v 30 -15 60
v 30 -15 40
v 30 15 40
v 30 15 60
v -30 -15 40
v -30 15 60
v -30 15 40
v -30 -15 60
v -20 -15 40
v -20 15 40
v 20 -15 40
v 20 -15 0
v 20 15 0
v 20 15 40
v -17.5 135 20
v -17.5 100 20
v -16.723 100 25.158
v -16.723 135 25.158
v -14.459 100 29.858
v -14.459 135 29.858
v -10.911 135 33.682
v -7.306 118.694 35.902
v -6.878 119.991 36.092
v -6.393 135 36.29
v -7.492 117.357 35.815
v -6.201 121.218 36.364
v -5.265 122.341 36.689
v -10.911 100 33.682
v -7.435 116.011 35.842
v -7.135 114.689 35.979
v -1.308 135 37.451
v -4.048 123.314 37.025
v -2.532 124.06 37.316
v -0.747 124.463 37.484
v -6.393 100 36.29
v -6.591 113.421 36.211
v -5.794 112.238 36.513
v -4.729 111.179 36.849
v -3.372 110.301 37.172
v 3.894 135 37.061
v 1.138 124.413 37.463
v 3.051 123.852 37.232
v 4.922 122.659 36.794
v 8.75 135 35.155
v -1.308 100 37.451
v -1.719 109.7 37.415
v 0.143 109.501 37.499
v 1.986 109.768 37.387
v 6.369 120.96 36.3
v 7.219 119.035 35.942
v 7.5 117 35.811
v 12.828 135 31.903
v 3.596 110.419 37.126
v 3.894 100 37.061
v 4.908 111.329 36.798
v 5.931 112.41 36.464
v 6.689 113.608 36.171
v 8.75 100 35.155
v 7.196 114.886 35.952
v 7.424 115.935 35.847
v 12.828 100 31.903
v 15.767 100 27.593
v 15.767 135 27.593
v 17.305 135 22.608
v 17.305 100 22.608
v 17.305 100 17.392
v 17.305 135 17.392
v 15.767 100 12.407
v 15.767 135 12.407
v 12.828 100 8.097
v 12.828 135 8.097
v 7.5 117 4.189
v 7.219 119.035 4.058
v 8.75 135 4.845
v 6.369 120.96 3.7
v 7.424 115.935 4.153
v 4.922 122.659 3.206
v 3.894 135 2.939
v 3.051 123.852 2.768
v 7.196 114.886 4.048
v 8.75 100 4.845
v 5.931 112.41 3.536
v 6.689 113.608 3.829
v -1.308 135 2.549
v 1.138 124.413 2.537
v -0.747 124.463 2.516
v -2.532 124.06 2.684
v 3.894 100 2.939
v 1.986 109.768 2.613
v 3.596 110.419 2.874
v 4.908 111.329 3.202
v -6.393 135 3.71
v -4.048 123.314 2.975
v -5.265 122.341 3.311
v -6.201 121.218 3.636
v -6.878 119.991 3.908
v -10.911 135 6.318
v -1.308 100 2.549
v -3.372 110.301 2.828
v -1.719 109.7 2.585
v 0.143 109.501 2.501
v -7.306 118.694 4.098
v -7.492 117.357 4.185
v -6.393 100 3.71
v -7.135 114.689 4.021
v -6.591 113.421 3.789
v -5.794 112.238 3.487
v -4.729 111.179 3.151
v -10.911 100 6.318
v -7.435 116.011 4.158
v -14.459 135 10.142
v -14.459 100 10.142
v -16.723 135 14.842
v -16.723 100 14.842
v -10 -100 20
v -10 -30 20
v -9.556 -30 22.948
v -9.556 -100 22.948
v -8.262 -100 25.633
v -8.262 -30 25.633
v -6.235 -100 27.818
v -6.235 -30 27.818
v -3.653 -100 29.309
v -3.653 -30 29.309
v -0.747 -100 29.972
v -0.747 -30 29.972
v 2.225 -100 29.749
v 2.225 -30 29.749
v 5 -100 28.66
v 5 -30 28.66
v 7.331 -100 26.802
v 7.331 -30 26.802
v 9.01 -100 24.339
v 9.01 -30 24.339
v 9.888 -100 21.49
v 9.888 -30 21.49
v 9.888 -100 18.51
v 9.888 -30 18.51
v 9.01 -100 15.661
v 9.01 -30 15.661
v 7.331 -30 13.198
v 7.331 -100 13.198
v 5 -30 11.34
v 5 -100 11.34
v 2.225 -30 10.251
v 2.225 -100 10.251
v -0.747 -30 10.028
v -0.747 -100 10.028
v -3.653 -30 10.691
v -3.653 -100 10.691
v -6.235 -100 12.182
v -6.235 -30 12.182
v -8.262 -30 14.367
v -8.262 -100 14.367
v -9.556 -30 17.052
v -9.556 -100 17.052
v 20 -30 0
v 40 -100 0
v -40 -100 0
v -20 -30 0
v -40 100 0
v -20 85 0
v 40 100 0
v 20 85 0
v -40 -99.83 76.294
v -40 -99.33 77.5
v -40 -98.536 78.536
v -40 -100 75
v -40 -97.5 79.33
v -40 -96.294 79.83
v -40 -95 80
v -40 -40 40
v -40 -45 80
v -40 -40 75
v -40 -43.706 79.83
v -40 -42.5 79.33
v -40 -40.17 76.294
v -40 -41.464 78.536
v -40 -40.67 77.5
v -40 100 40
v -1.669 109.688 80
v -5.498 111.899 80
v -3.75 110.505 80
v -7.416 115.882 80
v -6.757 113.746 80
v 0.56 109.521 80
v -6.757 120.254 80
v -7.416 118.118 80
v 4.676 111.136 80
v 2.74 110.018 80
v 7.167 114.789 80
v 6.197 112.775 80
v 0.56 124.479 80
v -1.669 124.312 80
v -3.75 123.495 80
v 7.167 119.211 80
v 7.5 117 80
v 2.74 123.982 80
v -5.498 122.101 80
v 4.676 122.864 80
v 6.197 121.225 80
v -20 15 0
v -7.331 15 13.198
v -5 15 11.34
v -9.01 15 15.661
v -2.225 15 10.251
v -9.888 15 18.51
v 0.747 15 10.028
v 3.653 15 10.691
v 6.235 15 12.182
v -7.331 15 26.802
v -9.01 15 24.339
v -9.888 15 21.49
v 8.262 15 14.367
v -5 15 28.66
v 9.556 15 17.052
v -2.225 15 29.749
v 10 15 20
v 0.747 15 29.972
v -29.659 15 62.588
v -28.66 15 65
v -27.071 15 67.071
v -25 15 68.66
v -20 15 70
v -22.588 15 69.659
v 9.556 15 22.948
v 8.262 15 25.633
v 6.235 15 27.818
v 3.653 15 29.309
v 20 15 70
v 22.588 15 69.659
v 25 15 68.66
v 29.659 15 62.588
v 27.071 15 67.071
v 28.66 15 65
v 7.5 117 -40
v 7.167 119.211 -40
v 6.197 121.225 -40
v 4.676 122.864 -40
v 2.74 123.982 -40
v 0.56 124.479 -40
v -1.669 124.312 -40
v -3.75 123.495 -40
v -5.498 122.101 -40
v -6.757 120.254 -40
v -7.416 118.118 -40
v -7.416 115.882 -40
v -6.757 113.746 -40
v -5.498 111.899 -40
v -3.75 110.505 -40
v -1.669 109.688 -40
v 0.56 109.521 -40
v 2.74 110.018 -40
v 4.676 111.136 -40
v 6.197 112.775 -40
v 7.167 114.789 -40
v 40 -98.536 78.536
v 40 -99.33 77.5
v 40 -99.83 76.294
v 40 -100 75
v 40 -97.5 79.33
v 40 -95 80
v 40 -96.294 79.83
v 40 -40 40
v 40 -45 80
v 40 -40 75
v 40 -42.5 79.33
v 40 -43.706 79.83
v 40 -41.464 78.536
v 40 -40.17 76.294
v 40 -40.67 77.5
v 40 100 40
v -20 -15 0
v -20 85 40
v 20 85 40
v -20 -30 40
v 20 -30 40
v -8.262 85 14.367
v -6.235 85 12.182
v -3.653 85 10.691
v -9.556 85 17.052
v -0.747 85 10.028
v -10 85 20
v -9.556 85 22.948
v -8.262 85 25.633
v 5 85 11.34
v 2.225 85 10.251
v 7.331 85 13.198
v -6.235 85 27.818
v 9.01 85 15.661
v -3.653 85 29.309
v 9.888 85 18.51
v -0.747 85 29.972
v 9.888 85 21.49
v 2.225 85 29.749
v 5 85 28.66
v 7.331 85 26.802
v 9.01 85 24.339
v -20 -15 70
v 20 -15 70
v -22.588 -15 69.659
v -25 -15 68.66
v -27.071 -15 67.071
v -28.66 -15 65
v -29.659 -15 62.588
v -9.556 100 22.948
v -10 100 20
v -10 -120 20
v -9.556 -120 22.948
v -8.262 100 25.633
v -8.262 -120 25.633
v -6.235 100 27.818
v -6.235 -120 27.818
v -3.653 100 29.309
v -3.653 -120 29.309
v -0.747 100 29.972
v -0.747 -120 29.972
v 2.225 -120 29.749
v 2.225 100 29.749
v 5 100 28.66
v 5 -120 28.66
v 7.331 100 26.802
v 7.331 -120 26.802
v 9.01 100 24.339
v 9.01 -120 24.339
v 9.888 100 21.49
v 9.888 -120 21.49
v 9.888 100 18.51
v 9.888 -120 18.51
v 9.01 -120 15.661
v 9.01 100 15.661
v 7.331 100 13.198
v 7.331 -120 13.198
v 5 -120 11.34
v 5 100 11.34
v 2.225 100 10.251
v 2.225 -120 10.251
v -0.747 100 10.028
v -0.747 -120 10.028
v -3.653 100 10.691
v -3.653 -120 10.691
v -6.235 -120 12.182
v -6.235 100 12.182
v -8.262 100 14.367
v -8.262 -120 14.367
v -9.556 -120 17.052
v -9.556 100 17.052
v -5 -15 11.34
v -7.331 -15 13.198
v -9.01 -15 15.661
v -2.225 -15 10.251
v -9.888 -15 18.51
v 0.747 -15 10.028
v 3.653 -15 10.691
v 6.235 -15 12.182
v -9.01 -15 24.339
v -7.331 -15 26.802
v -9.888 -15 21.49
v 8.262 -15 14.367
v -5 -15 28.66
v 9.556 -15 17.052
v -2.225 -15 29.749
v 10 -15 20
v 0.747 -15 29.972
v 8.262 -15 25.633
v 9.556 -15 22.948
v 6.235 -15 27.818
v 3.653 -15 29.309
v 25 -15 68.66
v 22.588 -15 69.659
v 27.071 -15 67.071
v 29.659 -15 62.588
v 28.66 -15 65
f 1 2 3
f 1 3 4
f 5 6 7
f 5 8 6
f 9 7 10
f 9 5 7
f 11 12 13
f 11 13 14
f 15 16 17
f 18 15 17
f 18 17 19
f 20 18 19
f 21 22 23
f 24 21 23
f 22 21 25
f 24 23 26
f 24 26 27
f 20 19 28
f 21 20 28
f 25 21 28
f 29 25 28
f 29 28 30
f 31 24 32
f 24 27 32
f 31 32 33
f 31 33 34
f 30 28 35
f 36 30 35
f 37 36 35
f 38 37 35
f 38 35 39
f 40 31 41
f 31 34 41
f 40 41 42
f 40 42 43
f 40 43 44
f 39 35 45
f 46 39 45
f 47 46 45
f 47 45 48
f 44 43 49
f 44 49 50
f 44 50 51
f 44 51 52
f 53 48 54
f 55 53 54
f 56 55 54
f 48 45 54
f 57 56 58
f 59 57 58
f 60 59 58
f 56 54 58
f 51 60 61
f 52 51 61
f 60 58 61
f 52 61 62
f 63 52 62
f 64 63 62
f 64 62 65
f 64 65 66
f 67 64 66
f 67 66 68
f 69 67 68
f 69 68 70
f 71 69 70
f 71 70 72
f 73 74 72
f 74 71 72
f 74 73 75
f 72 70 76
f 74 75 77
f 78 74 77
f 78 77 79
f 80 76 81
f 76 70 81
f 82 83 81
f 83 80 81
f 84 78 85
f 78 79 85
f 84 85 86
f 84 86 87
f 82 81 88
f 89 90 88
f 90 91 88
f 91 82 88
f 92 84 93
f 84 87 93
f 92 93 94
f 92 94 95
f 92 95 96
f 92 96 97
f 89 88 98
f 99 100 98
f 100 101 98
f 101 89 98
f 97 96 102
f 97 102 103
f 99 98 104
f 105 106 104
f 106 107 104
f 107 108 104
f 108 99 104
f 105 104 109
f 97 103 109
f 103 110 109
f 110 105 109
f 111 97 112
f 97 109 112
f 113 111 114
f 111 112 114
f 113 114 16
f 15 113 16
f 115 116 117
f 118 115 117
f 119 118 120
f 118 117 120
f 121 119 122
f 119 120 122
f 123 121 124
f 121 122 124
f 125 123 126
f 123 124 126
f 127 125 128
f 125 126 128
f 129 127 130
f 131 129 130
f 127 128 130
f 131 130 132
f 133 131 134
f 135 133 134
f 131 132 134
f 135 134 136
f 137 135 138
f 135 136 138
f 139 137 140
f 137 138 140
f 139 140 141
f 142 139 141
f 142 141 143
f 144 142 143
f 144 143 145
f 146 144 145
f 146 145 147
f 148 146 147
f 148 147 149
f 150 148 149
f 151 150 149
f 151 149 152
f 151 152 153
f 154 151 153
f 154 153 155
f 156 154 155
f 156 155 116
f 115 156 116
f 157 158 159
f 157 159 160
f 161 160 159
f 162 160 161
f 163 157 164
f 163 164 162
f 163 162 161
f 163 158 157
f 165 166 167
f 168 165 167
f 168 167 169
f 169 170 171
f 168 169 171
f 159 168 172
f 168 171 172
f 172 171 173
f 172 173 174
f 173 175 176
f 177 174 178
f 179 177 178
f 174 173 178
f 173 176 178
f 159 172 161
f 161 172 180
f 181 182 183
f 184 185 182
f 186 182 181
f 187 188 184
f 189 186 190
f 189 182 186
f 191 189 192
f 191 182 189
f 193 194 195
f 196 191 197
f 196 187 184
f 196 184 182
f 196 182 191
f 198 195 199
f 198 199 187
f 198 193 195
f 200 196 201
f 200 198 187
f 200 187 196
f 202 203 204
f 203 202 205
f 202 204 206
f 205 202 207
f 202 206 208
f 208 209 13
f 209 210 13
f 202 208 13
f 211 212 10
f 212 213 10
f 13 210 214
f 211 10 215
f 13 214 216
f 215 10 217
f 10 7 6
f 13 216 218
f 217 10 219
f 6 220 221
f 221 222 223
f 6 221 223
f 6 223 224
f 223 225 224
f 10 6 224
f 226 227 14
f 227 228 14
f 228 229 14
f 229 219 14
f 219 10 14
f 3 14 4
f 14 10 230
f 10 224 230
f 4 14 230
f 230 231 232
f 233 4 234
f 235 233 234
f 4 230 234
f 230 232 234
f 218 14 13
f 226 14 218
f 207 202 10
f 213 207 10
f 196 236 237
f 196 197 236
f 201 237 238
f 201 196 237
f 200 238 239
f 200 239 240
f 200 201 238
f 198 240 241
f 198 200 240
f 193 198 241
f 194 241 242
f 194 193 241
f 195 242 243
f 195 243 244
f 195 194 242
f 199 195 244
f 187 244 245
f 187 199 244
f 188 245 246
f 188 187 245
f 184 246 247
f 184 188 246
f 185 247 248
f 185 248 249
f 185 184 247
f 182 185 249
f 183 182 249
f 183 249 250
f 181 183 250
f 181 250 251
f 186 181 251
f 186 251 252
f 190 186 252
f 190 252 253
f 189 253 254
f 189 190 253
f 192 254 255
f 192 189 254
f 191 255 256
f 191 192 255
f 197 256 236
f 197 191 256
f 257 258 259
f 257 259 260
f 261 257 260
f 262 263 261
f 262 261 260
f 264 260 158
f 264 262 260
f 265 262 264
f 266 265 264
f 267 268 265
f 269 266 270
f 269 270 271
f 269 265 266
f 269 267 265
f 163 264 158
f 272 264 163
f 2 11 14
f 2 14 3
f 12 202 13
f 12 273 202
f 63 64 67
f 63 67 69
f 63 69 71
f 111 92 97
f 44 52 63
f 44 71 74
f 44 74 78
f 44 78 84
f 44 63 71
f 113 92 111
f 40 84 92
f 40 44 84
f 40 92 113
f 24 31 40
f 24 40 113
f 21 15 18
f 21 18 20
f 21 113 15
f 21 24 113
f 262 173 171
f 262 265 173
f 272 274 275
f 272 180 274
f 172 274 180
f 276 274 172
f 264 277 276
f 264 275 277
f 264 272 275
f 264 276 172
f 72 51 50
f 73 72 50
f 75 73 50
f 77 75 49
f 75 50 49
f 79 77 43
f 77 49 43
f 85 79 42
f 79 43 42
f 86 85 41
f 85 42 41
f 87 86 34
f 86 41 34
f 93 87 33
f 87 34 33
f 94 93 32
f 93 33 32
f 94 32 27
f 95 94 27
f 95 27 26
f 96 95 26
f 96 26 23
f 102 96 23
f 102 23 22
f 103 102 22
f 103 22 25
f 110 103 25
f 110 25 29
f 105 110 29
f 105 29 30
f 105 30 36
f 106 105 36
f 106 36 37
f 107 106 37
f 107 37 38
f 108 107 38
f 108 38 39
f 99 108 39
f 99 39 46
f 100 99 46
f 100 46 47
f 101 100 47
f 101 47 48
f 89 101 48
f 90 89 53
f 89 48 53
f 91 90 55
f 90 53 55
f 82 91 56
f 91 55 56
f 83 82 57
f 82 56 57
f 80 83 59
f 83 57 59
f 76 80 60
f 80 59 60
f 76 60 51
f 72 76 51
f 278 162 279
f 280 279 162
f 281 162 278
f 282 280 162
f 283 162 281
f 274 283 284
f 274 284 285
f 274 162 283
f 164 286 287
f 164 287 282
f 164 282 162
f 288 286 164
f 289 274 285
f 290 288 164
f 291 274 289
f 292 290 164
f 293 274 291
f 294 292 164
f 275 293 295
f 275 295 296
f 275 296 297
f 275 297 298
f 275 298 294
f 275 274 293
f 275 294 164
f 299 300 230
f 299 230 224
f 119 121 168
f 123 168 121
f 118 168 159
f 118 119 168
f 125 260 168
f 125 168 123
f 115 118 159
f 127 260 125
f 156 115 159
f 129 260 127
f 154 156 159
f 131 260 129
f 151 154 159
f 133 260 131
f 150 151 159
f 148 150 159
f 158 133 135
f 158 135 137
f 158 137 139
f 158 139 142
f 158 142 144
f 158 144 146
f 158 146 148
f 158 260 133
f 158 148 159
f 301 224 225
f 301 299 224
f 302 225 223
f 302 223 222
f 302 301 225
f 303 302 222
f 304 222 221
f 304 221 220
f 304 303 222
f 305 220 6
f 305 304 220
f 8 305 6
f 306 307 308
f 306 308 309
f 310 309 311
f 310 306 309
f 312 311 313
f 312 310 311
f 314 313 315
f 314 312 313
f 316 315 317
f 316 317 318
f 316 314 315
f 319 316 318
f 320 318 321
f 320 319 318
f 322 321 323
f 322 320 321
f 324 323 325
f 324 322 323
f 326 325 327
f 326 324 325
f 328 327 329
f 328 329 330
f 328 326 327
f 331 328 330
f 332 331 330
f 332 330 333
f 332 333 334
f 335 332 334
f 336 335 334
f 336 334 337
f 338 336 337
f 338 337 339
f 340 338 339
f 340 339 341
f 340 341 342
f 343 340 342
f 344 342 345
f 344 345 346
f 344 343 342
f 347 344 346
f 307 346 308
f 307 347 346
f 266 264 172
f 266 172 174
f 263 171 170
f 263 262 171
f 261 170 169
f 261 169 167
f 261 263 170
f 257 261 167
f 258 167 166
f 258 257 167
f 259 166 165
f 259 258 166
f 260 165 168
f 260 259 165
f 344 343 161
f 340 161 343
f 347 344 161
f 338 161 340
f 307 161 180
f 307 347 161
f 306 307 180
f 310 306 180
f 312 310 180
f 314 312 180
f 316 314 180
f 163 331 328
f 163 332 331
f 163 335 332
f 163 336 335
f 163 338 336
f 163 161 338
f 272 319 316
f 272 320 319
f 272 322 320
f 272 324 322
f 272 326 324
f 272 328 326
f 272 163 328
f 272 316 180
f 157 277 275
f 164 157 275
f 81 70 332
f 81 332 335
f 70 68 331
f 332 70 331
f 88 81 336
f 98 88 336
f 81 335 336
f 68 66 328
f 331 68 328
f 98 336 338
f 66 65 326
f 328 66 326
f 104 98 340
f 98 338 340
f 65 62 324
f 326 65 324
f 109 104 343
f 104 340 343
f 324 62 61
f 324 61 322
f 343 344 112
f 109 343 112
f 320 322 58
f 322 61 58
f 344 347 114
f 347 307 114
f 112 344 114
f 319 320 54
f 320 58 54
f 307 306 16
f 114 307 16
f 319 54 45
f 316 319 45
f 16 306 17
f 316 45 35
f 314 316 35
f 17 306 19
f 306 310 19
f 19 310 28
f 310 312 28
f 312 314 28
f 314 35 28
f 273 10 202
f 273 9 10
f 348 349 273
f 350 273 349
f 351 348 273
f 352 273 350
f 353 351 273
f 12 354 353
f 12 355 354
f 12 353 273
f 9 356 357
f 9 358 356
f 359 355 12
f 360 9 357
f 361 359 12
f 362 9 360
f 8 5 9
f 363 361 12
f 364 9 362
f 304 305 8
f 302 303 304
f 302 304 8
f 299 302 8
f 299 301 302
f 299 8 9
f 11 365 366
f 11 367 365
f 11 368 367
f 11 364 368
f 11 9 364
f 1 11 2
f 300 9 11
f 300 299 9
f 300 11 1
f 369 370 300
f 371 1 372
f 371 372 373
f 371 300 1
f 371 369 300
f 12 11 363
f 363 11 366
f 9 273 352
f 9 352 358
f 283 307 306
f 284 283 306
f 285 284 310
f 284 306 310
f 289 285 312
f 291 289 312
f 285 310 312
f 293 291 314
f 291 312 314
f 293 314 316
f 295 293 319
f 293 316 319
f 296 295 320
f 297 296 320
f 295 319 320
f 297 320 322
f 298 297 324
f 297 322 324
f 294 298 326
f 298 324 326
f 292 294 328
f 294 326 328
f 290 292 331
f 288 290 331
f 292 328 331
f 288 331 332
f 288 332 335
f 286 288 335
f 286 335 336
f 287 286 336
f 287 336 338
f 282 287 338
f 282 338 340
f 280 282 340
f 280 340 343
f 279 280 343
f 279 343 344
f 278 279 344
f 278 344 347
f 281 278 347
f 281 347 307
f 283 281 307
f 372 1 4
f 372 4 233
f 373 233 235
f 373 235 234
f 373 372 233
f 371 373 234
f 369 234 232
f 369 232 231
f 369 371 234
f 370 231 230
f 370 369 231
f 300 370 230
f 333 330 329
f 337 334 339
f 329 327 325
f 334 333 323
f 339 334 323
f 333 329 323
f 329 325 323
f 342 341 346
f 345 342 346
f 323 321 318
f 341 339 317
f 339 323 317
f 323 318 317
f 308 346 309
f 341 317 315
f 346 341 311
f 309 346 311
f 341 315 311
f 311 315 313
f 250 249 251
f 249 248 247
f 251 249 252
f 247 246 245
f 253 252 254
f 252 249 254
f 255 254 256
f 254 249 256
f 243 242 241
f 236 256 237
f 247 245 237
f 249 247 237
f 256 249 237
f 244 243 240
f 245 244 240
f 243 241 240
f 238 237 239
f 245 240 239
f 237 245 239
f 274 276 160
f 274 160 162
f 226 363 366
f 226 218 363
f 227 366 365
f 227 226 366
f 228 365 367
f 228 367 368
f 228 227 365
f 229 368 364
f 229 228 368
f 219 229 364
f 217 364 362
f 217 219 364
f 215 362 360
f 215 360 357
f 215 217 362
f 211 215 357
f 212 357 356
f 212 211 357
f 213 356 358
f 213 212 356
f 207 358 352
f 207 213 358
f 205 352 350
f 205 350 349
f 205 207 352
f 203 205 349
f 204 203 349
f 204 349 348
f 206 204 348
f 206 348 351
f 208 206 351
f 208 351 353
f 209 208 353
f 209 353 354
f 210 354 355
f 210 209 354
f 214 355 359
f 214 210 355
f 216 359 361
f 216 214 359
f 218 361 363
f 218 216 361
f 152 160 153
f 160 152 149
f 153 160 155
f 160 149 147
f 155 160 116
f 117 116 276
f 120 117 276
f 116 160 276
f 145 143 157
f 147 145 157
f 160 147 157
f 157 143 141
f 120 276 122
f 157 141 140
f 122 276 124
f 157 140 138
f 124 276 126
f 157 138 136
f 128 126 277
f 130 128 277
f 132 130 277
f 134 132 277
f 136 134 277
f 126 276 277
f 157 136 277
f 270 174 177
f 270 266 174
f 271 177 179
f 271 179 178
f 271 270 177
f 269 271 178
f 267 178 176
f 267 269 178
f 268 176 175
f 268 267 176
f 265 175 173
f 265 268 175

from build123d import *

# Parameters (mm, degrees)
F1_DEPTH       = 40
F2_W           = 40
F2_H           = 115
F3_DEPTH       = 40
F4_R           = 10
F5_DEPTH       = 200.001
F6_R           = 10
F7_DEPTH       = 15
F8_R           = 17.5
F8_R_2         = 10
F9_DEPTH       = 35
F10_DEPTH      = 220
F11_R          = 7.5
F12_DEPTH      = 40.001
F13_R          = 7.5
F14_DEPTH      = 40
F14_DEPTH_BACK = 80


with BuildPart() as f1:
    # F0 (on Right) → F1 (new body, symmetric)
    with BuildSketch(Plane.YZ):
        with BuildLine():
            ThreePointArc((-95, 80), (-98.5355339059, 78.5355339059), (-100, 75))
            Line((-100, 75), (-100, 0))
            Line((-100, 0), (100, 0))
            Line((100, 0), (100, 40))
            Line((100, 40), (-40, 40))
            Line((-40, 40), (-40, 75))
            ThreePointArc((-40, 75), (-41.4644660941, 78.5355339059), (-45, 80))
            Line((-45, 80), (-95, 80))
        make_face()
    extrude(amount=F1_DEPTH, both=True)

    # F2 (on face) → F3 (cut, through all)
    with BuildSketch(Plane.XY.offset(40)):
        with Locations((0, 27.5)):
            Rectangle(F2_W, F2_H)
    extrude(amount=-F3_DEPTH, mode=Mode.SUBTRACT)

    # F4 (on face) → F5 (cut, through all)
    with BuildSketch(Plane(origin=(0, 100, 0), x_dir=(-1, 0, 0), z_dir=(0, 1, 0))):
        with Locations((0, 20)):
            Circle(F4_R)
    extrude(amount=-F5_DEPTH, mode=Mode.SUBTRACT)


with BuildPart() as f7:
    # F6 (on Front) → F7 (new body, symmetric)
    with BuildSketch(Plane.XZ):
        with BuildLine():
            Line((-20, 0), (20, 0))
            Line((20, 0), (20, 40))
            Line((20, 40), (30, 40))
            Line((30, 40), (30, 60))
            ThreePointArc((30, 60), (27.0710678119, 67.0710678119), (20, 70))
            Line((20, 70), (-20, 70))
            ThreePointArc((-20, 70), (-27.0710678119, 67.0710678119), (-30, 60))
            Line((-30, 60), (-30, 40))
            Line((-30, 40), (-20, 40))
            Line((-20, 40), (-20, 0))
        make_face()
        with Locations((0, 20)):
            Circle(F6_R, mode=Mode.SUBTRACT)
    extrude(amount=F7_DEPTH, both=True)


with BuildPart() as f9:
    # F8 (on face) → F9 (new body)
    with BuildSketch(Plane(origin=(0, 100, 0), x_dir=(-1, 0, 0), z_dir=(0, 1, 0))):
        with Locations((0, 20)):
            Circle(F8_R)
        with Locations((0, 20)):
            Circle(F8_R_2, mode=Mode.SUBTRACT)
        with Locations((0, 20)):
            Circle(F8_R_2)
    extrude(amount=F9_DEPTH)

    # F8 (on face) → F10 (join)
    with BuildSketch(Plane(origin=(0, 100, 0), x_dir=(-1, 0, 0), z_dir=(0, 1, 0))):
        with Locations((0, 20)):
            Circle(F8_R_2)
    extrude(amount=-F10_DEPTH)

    # F11 (on face) → F12 (cut, through all)
    with BuildSketch(Plane.XY.offset(40)):
        with Locations((0, 117)):
            Circle(F11_R)
    extrude(amount=-F12_DEPTH, mode=Mode.SUBTRACT)


with BuildPart() as f14:
    # F13 (on face) → F14 (new body, two sides)
    with BuildSketch(Plane.XY.offset(40)) as f14_sk:
        with Locations((0, 117)):
            Circle(F13_R)
    extrude(amount=F14_DEPTH)
    extrude(f14_sk.sketch, amount=-F14_DEPTH_BACK)


solid = Compound([f1.part, f7.part, f9.part, f14.part])
